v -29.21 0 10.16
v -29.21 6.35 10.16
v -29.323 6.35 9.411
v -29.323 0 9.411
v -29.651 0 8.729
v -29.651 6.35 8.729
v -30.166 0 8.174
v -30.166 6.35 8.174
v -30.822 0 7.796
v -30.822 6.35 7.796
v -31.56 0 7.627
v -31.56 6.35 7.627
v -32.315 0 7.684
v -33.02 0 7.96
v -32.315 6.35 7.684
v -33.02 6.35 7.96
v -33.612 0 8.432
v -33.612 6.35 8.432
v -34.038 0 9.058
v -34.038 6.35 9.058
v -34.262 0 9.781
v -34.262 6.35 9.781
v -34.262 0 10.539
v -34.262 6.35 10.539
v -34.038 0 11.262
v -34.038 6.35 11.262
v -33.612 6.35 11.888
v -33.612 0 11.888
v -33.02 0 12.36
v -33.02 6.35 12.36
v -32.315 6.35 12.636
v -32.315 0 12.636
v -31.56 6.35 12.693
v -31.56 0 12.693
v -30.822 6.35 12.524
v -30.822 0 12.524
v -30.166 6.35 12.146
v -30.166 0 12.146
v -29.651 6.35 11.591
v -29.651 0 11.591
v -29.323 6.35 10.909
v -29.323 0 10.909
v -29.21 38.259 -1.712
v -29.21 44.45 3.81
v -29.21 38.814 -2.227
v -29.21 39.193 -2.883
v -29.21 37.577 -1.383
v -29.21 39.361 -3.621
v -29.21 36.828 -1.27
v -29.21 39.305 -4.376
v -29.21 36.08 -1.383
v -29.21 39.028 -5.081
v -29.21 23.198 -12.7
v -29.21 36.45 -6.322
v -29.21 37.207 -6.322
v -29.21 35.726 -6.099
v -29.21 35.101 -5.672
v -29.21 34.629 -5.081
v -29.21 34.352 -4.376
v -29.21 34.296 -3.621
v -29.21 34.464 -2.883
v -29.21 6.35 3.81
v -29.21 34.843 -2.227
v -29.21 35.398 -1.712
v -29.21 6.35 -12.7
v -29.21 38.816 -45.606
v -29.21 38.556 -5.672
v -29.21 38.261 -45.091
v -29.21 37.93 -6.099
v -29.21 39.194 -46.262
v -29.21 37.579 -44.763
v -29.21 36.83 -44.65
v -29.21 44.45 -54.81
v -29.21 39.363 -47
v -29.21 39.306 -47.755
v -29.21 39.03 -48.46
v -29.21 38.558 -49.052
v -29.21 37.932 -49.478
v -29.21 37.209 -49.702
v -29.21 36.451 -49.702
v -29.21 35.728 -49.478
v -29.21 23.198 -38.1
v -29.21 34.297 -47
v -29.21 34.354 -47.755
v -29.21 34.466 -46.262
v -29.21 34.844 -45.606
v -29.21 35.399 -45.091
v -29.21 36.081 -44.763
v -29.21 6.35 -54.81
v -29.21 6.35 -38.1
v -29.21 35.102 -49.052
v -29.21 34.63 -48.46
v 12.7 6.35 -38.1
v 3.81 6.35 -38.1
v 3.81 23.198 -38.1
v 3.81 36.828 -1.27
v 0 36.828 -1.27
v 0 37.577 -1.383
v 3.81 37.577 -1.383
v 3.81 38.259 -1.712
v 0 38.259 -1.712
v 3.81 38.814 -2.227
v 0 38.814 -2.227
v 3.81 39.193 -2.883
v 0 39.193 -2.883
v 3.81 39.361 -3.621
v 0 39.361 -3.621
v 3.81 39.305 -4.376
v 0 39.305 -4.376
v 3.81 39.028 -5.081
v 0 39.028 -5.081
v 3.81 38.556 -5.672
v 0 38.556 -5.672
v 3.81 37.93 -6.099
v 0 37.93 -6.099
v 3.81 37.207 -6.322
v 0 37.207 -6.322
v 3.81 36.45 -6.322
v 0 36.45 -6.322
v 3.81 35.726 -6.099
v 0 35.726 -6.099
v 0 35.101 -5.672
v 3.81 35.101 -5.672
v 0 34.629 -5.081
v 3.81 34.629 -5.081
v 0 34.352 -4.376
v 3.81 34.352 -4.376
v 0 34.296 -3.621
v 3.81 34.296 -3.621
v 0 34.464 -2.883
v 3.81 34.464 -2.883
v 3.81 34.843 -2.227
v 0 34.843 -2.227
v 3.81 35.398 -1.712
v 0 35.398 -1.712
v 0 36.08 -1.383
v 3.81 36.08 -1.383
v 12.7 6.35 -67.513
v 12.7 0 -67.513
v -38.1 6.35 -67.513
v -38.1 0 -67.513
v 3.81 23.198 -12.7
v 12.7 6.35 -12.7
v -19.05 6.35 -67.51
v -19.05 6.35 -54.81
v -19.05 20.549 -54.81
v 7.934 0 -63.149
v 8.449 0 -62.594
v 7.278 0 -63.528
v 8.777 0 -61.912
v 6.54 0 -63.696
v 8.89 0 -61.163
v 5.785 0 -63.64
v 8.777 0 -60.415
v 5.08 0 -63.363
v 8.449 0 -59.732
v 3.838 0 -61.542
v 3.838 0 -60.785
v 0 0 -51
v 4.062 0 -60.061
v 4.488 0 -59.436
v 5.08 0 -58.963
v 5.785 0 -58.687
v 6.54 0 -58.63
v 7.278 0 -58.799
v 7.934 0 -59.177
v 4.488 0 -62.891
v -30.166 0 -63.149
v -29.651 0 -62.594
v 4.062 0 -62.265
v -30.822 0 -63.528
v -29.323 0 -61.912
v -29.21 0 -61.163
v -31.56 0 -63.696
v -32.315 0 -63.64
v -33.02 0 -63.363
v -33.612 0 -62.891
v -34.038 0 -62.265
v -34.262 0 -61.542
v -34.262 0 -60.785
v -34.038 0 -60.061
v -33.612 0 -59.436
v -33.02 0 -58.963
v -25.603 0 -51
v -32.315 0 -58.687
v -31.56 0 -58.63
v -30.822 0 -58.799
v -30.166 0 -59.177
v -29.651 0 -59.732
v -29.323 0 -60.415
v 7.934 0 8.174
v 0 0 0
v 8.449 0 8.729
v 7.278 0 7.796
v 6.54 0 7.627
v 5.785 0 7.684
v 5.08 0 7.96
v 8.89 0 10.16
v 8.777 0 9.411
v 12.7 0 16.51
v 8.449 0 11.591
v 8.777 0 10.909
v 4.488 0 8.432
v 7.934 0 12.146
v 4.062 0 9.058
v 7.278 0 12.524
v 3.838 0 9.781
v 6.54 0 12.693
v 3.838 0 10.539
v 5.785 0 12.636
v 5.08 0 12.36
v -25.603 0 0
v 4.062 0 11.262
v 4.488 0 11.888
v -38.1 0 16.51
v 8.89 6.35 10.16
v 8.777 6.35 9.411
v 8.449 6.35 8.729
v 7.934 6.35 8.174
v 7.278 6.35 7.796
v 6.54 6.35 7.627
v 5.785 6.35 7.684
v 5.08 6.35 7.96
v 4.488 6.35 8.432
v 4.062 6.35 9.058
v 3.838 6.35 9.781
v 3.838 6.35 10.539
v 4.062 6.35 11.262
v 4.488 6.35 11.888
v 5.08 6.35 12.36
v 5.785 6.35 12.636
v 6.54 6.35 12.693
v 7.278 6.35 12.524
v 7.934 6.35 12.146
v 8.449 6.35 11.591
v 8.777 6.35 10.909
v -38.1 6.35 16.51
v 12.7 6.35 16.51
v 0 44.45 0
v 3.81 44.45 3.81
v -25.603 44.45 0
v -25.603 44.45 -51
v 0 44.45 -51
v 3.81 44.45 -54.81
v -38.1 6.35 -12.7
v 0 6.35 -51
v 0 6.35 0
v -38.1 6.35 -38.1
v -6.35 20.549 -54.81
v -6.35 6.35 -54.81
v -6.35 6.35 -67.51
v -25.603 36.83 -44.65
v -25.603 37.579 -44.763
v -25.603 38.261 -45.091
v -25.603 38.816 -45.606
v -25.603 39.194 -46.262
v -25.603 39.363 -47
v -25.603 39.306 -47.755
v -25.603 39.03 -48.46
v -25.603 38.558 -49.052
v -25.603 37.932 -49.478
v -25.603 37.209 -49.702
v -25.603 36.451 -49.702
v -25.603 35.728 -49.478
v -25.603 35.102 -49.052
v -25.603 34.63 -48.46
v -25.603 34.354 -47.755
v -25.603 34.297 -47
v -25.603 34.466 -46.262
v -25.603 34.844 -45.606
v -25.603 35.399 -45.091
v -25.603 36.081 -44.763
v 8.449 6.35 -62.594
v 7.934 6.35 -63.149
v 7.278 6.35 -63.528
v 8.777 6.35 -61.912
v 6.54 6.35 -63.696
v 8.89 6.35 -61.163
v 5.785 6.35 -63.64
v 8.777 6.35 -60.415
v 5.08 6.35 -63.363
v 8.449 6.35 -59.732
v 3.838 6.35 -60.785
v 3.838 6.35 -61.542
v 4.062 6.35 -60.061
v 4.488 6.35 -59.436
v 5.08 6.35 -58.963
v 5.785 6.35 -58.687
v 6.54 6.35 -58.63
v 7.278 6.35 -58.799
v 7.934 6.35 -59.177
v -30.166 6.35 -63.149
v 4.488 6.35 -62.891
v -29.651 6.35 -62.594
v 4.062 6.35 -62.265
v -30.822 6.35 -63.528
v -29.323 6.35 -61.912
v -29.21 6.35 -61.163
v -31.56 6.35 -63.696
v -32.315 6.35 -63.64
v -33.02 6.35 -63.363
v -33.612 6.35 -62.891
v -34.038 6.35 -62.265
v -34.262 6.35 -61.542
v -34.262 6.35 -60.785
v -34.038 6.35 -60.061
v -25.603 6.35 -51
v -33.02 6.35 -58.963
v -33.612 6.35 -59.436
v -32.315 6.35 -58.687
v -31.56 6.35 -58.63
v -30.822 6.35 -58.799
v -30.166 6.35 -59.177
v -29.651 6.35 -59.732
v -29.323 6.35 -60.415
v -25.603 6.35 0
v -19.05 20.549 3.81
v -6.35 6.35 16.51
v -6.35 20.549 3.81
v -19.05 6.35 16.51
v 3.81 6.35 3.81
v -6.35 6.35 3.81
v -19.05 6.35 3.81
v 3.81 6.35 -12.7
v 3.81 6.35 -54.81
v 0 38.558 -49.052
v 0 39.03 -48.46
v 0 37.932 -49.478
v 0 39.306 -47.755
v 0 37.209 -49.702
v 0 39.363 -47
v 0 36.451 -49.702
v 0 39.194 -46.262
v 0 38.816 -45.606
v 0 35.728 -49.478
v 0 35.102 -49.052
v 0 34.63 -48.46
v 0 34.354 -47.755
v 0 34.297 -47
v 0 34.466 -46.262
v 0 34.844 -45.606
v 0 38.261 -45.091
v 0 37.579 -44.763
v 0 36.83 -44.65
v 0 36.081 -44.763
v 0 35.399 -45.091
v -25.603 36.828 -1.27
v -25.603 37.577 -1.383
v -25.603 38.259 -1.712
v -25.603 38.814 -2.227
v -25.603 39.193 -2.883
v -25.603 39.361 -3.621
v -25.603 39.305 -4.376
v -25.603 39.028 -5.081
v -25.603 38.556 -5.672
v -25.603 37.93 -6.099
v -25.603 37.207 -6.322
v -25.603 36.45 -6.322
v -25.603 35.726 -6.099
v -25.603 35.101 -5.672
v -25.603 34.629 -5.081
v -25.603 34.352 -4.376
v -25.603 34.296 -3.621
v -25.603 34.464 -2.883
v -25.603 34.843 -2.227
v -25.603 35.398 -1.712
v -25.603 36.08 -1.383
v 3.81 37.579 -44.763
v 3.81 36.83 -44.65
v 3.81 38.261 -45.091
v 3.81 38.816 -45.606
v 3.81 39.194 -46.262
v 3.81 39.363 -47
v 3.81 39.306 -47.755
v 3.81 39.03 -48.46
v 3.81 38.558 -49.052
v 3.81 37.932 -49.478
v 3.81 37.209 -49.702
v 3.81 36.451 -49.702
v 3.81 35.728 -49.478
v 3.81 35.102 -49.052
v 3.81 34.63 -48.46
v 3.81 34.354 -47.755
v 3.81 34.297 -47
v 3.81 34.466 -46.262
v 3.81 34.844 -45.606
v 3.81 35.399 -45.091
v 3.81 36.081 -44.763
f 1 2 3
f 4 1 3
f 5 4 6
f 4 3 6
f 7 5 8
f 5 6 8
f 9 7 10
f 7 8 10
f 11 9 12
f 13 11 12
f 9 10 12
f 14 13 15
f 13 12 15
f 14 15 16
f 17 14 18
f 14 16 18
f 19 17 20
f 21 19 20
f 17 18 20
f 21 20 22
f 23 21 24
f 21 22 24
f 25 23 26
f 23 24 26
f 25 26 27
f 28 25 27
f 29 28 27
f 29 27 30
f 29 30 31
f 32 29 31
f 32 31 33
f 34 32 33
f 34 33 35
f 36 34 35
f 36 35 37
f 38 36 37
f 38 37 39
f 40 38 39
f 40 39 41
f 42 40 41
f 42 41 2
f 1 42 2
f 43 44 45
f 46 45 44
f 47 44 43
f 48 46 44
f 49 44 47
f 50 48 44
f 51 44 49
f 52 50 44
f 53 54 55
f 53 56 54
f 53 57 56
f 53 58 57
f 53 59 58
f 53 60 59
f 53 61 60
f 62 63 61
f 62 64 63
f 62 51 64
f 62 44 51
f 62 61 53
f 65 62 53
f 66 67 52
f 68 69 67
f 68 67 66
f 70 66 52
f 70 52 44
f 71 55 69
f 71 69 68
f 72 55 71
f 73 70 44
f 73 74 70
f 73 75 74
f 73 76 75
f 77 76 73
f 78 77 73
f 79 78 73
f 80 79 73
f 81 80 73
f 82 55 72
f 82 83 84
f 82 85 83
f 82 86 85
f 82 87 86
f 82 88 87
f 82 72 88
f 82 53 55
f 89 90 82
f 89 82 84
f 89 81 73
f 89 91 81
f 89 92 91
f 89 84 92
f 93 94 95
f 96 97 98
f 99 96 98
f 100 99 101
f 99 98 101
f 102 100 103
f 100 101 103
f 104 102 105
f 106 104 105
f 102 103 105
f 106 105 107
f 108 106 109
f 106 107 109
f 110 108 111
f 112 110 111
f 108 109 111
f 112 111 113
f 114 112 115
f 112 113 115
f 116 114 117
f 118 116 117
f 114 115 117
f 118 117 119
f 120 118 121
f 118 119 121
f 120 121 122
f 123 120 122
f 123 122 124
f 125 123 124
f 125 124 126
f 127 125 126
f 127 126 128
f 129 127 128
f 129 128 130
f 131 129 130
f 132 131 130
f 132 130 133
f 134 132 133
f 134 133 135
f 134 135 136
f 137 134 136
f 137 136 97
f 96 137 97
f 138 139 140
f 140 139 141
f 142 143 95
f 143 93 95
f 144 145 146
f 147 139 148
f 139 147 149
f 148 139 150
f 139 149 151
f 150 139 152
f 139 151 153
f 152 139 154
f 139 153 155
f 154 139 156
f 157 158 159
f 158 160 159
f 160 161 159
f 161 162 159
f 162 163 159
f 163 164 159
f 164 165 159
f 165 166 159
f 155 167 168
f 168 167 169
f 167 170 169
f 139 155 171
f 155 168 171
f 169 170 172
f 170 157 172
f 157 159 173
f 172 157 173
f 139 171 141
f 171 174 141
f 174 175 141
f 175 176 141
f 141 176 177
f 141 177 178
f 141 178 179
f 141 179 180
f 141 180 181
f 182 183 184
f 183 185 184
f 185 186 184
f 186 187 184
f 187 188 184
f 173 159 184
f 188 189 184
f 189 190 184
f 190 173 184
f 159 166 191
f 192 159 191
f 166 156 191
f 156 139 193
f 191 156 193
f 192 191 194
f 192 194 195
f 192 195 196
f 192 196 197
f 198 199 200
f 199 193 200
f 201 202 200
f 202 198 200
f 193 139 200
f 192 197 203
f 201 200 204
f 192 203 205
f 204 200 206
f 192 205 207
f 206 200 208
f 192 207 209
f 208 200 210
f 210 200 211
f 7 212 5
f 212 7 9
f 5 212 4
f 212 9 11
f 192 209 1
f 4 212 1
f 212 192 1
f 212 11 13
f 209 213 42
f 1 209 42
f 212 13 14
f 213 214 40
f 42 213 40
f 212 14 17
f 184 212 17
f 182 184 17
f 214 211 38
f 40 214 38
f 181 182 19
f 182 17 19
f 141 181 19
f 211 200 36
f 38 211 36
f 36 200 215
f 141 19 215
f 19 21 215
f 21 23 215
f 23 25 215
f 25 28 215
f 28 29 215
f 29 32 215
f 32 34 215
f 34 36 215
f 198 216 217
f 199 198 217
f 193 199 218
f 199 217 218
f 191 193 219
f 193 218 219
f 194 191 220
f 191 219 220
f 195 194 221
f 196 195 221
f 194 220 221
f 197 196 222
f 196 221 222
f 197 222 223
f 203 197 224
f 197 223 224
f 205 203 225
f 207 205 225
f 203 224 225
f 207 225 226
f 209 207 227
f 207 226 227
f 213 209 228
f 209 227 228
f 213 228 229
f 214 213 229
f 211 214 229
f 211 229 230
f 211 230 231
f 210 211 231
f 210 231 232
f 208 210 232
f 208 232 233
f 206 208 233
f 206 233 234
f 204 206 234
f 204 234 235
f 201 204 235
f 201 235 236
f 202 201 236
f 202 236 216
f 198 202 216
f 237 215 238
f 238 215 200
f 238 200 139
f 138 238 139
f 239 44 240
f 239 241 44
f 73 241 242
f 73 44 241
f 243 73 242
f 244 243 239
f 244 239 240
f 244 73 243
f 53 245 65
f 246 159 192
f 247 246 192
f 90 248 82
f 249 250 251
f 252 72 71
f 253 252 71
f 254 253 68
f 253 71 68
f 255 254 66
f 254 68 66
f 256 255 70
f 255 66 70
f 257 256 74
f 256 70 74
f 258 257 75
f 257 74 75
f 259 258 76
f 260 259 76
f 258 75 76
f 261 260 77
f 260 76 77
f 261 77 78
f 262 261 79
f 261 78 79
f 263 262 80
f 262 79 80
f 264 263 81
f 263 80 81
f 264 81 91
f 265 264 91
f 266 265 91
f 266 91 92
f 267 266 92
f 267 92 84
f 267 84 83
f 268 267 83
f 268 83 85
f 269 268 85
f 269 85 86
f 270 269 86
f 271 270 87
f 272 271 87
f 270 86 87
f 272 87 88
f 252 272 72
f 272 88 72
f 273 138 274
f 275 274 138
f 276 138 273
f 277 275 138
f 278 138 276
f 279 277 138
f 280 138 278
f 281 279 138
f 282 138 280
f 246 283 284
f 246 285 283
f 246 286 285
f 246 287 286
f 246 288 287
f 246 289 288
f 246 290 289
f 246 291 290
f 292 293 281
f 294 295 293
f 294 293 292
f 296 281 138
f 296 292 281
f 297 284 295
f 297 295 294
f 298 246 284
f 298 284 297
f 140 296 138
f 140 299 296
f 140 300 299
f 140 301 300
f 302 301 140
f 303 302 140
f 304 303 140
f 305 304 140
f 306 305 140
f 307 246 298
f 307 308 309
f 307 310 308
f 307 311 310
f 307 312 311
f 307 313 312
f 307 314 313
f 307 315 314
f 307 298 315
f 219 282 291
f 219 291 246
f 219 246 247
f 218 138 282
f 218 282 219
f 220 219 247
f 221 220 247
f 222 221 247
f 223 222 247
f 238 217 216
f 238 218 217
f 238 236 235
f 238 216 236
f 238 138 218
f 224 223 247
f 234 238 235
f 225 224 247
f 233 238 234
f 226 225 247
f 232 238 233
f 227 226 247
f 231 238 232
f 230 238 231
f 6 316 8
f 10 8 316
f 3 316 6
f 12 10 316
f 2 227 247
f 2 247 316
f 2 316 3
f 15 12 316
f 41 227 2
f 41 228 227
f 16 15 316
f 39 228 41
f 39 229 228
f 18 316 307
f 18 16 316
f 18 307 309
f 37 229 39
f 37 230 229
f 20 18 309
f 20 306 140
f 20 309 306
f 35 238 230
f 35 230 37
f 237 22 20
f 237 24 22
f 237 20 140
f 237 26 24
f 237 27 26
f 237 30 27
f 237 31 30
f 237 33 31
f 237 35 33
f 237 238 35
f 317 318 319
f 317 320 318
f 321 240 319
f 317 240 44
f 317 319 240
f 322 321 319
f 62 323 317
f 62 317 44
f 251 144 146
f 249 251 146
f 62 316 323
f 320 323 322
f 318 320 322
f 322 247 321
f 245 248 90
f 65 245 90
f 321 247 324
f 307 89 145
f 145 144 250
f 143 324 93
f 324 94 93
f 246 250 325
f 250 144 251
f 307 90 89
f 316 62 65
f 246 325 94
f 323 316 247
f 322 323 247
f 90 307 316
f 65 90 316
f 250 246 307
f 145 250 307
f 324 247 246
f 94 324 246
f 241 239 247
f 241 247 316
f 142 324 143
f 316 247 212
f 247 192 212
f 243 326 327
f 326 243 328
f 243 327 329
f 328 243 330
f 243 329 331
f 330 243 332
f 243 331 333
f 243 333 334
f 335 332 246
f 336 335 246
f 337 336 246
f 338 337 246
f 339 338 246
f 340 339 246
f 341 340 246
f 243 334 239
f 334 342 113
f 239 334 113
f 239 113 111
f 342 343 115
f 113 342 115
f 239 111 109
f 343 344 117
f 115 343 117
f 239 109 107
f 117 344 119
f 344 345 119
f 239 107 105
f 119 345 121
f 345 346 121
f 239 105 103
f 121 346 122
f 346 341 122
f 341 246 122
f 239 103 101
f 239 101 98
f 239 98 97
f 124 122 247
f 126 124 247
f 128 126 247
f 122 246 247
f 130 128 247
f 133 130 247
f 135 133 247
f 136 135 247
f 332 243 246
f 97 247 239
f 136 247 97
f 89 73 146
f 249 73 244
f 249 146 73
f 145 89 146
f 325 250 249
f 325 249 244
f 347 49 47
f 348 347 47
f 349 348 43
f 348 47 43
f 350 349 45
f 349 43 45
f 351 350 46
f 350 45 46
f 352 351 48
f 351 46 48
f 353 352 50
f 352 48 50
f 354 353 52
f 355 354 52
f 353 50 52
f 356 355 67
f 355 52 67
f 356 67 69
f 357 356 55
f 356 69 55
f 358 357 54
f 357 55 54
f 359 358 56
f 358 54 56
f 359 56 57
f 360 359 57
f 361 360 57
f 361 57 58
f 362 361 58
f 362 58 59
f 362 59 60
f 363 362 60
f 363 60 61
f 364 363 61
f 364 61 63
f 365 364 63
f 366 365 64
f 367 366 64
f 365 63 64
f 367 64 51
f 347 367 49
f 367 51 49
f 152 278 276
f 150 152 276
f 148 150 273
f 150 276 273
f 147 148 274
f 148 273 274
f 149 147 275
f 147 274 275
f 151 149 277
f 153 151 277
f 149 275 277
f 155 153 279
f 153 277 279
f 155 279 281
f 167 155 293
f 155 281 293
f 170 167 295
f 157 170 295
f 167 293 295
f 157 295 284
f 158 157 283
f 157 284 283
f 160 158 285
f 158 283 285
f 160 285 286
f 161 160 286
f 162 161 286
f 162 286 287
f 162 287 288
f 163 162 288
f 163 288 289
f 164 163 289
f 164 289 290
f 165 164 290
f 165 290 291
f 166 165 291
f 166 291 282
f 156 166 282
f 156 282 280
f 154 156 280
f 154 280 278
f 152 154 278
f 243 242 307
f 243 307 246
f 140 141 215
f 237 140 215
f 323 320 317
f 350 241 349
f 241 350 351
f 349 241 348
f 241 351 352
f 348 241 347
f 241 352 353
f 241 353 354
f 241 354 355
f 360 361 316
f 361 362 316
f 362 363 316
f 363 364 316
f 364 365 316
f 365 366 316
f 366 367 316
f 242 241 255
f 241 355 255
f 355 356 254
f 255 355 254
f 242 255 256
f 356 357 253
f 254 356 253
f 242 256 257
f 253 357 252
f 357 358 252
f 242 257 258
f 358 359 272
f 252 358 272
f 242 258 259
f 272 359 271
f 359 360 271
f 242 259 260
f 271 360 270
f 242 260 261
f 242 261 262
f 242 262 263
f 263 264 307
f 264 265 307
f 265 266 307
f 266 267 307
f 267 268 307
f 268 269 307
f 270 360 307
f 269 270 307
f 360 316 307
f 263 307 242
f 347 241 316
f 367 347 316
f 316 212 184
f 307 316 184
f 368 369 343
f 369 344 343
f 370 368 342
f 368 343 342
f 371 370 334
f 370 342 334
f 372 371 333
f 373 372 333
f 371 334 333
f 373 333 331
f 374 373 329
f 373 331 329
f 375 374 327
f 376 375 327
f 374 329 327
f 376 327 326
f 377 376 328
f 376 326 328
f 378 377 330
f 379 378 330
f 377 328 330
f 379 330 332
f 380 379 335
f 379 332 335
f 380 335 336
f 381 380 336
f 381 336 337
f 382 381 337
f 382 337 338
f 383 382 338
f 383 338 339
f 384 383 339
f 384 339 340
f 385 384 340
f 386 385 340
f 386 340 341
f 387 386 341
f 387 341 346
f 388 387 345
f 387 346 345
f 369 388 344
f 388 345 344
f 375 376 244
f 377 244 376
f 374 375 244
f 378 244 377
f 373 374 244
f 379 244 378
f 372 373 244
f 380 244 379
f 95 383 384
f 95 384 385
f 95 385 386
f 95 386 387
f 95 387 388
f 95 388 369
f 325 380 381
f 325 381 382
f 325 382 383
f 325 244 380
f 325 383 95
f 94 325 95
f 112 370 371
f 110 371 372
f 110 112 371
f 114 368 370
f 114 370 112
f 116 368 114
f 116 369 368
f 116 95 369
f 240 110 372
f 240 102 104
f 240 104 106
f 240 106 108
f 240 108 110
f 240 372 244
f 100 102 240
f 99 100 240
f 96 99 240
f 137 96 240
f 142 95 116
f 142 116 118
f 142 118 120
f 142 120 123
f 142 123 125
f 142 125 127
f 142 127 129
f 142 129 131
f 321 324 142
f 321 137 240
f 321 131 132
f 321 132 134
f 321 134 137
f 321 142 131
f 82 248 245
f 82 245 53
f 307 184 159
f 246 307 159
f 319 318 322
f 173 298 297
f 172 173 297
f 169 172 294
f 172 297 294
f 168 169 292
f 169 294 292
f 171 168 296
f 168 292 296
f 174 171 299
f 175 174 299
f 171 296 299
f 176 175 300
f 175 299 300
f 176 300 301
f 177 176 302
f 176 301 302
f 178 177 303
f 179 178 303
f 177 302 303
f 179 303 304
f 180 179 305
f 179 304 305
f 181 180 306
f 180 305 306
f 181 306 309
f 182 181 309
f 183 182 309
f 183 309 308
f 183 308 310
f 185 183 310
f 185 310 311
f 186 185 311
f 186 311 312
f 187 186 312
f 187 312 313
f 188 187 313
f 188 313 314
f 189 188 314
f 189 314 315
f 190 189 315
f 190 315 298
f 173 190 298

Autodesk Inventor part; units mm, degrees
ref_plane "YZ Plane" through (0, 0, 0) normal (1, 0, 0) x (0, 1, 0)
sketch "Sketch7" plane through (0, 0, 0) normal (0, 1, 0) x (-1, 0, 0)
  line L0 (25.6032, 0) -> (25.6032, -51) construction
  line L1 (0, 3.81) -> (0, 0) construction
  line L2 (25.6032, -51) -> (0, -51) construction
  line L3 (0, -51) -> (0, 0) construction
  line L4 (0, 0) -> (25.6032, 0) construction
  line L5 (25.6032, 0) -> (25.6032, -51) construction
  line L6 (15.875, -67.51) -> (38.1, -67.51) construction
  line L7 (38.1, -15.875) -> (38.1, 16.51) projected
  line L8 (38.1, 16.51) -> (-12.7, 16.51)
  line L9 (-12.7, 16.51) -> (-12.7, -67.5132)
  line L10 (-12.7, -67.5132) -> (38.1, -67.5132)
  line L11 (38.1, -67.5132) -> (38.1, 16.51)
  line L12 (25.6032, -51) -> (0, -51)
  line L13 (0, -51) -> (0, 0)
  line L14 (0, 0) -> (25.6032, 0)
  line L15 (25.6032, 0) -> (25.6032, -51)
  dimension "d47" = 50.8
  dimension "d48" = 84.0232
extrude "Extrusion7" add sketch "Sketch7" along normal blind 6.35
sketch "Sketch8" plane through (0, 6.35, 0) normal (0, 1, 0) x (1, 0, 0)
  line L0 (-29.21, 54.81) -> (3.81, 54.81)
  line L1 (3.81, 54.81) -> (3.81, -3.81)
  line L2 (3.81, -3.81) -> (-29.21, -3.81)
  line L3 (-29.21, -3.81) -> (-29.21, 54.81)
  line L4 (-25.6032, 0) -> (-25.6032, 51) projected
  line L5 (0, 0) -> (-25.6032, 0) projected
  line L6 (-25.6032, 51) -> (0, 51)
  line L7 (0, 51) -> (0, 0)
  line L8 (0, 0) -> (-25.6032, 0)
  line L9 (-25.6032, 0) -> (-25.6032, 51)
  dimension "d51" = 33.02
extrude "Extrusion8" add sketch "Sketch8" along normal blind 38.1 separate body
ref_plane "Work Plane3" through (-29.21, 6.35, -25.4) normal (0, 0, 1) x (1, 0, 0)
ref_plane "Work Plane4" through (-12.7, 6.35, 3.81) normal (1, 0, 0) x (0, 0, -1)
sketch "Sketch9" plane through (-12.7, 6.35, 3.81) normal (1, 0, 0) x (0, 0, -1)
  line L0 (3.81, 38.1) -> (54.81, 38.1) construction
  line L1 (29.31, 38.1) -> (29.31, 0) construction
  line L2 (54.81, 0) -> (3.81, 0) construction
  line L3 (-12.7, -6.35) -> (-12.7, 0) projected
  line L4 (-12.7, 0) -> (0, 14.199)
  line L5 (0, 14.199) -> (0, 0)
  line L6 (0, 0) -> (-12.7, 0)
  line L7 (71.32, 0) -> (58.62, 14.199)
  line L8 (58.62, 14.199) -> (58.62, 0)
  line L9 (58.62, 0) -> (71.32, 0)
  point P0 (3.81, -6.35)
  dimension "d56" = 19.05
extrude "Extrusion9" add sketch "Sketch9" along normal mid plane 12.7 bodies 2
sketch "Sketch10" plane through (-29.21, 6.35, -25.4) normal (0, 0, 1) x (1, 0, 0)
  line L0 (0, 38.1) -> (33.02, 38.1) construction
  line L1 (16.51, 38.1) -> (16.4084, 0) construction
  line L2 (29.21, 0) -> (3.6068, 0) construction
  line L3 (41.91, -6.35) -> (41.91, 0) projected
  line L4 (41.91, 0) -> (33.02, 16.8485)
  line L5 (33.02, 16.8485) -> (33.02, 0)
  line L6 (33.02, 0) -> (41.91, 0)
  line L7 (-8.89, -6.35) -> (-8.89, 0) projected
  line L8 (-8.89, 0) -> (0, 16.8485)
  line L9 (0, 0) -> (0, 38.1) projected
  line L10 (0, 16.8485) -> (0, 0)
  line L11 (0, 0) -> (-8.89, 0)
  point P0 (29.21, -6.35)
  dimension "d59" = 19.05
  dimension "d60" = 19.05
extrude "Extrusion10" add sketch "Sketch10" along normal mid plane 25.4 bodies 2
sketch "Sketch11" plane through (0, 6.35, 0) normal (0, 1, 0) x (1, 0, 0)
  circle A0 centre (6.35, 61.1632) radius 2.54
  line L0 (12.7, -16.51) -> (12.7, 67.5132) projected
  line L1 (12.7, 67.5132) -> (-38.1, 67.5132) projected
  line L2 (12.7, 25.5016) -> (-38.1, 25.5016) construction
  line L3 (-38.1, 67.5132) -> (-38.1, -16.51) construction
  line L4 (-12.7, -16.51) -> (-12.7, 67.5132) construction
  circle A1 centre (6.35, -10.16) radius 2.54
  circle A2 centre (-31.75, 61.1632) radius 2.54
  circle A3 centre (-31.75, -10.16) radius 2.54
  point P0 (0, 0)
  dimension "d63" = 5.08
  dimension "d64" = 6.35
  dimension "d65" = 6.35
extrude "Extrusion11" cut sketch "Sketch11" against normal through all bodies 1
sketch "Sketch12" plane through (-29.21, 6.35, 3.81) normal (-1, 0, 0) x (0, 0, 1)
  circle A0 centre (-51, 30.48) radius 2.54
  line L0 (-58.62, 38.1) -> (0, 38.1) construction
  line L1 (-29.31, 38.1) -> (-29.3116, -6.35) construction
  line L2 (-71.3232, -6.35) -> (12.7, -6.35) construction
  line L3 (-58.62, 0) -> (-58.62, 38.1) construction
  circle A1 centre (-7.6205, 30.4784) radius 2.54
  point P0 (-3.81, -6.35)
  dimension "d68" = 5.08
  dimension "d69" = 7.62
  dimension "d70" = 7.62
extrude "Extrusion12" cut sketch "Sketch12" against normal through all bodies 2
properties part number "2x1AttachmentWrap"
